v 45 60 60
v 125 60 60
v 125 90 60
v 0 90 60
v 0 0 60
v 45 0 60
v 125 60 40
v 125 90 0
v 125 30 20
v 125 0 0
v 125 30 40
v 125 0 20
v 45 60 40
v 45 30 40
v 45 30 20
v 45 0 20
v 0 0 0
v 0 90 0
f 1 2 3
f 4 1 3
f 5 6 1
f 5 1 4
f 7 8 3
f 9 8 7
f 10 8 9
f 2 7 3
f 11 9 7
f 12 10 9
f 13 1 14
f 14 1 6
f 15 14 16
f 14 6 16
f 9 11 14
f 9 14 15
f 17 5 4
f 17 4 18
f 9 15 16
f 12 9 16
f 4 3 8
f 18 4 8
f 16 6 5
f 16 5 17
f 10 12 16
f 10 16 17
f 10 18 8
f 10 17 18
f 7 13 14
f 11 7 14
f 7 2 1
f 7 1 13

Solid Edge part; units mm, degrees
sketch "Sketch1" plane through (0, 0, 0) normal (0, -1, 0) x (1, 0, 0)
  line L0 (125, 60) -> (0, 60)
  line L1 (0, 60) -> (0, 0)
  line L2 (0, 0) -> (125, 0)
  line L3 (125, 0) -> (125, 60)
extrude "Protrusion1" add sketch "Sketch1" against normal blind 90
sketch "Sketch2" plane through (125, 45, 30) normal (1, 0, 0) x (0, 1, 0)
  line L0 (-45, -10) -> (-45, 30)
  line L1 (-45, 30) -> (15, 30)
  line L2 (15, 30) -> (15, 10)
  line L3 (15, 10) -> (-15, 10)
  line L4 (-15, 10) -> (-15, -10)
  line L5 (-15, -10) -> (-45, -10)
extrude "ExtrudedCutout_1" cut sketch "Sketch2" against normal blind 80
